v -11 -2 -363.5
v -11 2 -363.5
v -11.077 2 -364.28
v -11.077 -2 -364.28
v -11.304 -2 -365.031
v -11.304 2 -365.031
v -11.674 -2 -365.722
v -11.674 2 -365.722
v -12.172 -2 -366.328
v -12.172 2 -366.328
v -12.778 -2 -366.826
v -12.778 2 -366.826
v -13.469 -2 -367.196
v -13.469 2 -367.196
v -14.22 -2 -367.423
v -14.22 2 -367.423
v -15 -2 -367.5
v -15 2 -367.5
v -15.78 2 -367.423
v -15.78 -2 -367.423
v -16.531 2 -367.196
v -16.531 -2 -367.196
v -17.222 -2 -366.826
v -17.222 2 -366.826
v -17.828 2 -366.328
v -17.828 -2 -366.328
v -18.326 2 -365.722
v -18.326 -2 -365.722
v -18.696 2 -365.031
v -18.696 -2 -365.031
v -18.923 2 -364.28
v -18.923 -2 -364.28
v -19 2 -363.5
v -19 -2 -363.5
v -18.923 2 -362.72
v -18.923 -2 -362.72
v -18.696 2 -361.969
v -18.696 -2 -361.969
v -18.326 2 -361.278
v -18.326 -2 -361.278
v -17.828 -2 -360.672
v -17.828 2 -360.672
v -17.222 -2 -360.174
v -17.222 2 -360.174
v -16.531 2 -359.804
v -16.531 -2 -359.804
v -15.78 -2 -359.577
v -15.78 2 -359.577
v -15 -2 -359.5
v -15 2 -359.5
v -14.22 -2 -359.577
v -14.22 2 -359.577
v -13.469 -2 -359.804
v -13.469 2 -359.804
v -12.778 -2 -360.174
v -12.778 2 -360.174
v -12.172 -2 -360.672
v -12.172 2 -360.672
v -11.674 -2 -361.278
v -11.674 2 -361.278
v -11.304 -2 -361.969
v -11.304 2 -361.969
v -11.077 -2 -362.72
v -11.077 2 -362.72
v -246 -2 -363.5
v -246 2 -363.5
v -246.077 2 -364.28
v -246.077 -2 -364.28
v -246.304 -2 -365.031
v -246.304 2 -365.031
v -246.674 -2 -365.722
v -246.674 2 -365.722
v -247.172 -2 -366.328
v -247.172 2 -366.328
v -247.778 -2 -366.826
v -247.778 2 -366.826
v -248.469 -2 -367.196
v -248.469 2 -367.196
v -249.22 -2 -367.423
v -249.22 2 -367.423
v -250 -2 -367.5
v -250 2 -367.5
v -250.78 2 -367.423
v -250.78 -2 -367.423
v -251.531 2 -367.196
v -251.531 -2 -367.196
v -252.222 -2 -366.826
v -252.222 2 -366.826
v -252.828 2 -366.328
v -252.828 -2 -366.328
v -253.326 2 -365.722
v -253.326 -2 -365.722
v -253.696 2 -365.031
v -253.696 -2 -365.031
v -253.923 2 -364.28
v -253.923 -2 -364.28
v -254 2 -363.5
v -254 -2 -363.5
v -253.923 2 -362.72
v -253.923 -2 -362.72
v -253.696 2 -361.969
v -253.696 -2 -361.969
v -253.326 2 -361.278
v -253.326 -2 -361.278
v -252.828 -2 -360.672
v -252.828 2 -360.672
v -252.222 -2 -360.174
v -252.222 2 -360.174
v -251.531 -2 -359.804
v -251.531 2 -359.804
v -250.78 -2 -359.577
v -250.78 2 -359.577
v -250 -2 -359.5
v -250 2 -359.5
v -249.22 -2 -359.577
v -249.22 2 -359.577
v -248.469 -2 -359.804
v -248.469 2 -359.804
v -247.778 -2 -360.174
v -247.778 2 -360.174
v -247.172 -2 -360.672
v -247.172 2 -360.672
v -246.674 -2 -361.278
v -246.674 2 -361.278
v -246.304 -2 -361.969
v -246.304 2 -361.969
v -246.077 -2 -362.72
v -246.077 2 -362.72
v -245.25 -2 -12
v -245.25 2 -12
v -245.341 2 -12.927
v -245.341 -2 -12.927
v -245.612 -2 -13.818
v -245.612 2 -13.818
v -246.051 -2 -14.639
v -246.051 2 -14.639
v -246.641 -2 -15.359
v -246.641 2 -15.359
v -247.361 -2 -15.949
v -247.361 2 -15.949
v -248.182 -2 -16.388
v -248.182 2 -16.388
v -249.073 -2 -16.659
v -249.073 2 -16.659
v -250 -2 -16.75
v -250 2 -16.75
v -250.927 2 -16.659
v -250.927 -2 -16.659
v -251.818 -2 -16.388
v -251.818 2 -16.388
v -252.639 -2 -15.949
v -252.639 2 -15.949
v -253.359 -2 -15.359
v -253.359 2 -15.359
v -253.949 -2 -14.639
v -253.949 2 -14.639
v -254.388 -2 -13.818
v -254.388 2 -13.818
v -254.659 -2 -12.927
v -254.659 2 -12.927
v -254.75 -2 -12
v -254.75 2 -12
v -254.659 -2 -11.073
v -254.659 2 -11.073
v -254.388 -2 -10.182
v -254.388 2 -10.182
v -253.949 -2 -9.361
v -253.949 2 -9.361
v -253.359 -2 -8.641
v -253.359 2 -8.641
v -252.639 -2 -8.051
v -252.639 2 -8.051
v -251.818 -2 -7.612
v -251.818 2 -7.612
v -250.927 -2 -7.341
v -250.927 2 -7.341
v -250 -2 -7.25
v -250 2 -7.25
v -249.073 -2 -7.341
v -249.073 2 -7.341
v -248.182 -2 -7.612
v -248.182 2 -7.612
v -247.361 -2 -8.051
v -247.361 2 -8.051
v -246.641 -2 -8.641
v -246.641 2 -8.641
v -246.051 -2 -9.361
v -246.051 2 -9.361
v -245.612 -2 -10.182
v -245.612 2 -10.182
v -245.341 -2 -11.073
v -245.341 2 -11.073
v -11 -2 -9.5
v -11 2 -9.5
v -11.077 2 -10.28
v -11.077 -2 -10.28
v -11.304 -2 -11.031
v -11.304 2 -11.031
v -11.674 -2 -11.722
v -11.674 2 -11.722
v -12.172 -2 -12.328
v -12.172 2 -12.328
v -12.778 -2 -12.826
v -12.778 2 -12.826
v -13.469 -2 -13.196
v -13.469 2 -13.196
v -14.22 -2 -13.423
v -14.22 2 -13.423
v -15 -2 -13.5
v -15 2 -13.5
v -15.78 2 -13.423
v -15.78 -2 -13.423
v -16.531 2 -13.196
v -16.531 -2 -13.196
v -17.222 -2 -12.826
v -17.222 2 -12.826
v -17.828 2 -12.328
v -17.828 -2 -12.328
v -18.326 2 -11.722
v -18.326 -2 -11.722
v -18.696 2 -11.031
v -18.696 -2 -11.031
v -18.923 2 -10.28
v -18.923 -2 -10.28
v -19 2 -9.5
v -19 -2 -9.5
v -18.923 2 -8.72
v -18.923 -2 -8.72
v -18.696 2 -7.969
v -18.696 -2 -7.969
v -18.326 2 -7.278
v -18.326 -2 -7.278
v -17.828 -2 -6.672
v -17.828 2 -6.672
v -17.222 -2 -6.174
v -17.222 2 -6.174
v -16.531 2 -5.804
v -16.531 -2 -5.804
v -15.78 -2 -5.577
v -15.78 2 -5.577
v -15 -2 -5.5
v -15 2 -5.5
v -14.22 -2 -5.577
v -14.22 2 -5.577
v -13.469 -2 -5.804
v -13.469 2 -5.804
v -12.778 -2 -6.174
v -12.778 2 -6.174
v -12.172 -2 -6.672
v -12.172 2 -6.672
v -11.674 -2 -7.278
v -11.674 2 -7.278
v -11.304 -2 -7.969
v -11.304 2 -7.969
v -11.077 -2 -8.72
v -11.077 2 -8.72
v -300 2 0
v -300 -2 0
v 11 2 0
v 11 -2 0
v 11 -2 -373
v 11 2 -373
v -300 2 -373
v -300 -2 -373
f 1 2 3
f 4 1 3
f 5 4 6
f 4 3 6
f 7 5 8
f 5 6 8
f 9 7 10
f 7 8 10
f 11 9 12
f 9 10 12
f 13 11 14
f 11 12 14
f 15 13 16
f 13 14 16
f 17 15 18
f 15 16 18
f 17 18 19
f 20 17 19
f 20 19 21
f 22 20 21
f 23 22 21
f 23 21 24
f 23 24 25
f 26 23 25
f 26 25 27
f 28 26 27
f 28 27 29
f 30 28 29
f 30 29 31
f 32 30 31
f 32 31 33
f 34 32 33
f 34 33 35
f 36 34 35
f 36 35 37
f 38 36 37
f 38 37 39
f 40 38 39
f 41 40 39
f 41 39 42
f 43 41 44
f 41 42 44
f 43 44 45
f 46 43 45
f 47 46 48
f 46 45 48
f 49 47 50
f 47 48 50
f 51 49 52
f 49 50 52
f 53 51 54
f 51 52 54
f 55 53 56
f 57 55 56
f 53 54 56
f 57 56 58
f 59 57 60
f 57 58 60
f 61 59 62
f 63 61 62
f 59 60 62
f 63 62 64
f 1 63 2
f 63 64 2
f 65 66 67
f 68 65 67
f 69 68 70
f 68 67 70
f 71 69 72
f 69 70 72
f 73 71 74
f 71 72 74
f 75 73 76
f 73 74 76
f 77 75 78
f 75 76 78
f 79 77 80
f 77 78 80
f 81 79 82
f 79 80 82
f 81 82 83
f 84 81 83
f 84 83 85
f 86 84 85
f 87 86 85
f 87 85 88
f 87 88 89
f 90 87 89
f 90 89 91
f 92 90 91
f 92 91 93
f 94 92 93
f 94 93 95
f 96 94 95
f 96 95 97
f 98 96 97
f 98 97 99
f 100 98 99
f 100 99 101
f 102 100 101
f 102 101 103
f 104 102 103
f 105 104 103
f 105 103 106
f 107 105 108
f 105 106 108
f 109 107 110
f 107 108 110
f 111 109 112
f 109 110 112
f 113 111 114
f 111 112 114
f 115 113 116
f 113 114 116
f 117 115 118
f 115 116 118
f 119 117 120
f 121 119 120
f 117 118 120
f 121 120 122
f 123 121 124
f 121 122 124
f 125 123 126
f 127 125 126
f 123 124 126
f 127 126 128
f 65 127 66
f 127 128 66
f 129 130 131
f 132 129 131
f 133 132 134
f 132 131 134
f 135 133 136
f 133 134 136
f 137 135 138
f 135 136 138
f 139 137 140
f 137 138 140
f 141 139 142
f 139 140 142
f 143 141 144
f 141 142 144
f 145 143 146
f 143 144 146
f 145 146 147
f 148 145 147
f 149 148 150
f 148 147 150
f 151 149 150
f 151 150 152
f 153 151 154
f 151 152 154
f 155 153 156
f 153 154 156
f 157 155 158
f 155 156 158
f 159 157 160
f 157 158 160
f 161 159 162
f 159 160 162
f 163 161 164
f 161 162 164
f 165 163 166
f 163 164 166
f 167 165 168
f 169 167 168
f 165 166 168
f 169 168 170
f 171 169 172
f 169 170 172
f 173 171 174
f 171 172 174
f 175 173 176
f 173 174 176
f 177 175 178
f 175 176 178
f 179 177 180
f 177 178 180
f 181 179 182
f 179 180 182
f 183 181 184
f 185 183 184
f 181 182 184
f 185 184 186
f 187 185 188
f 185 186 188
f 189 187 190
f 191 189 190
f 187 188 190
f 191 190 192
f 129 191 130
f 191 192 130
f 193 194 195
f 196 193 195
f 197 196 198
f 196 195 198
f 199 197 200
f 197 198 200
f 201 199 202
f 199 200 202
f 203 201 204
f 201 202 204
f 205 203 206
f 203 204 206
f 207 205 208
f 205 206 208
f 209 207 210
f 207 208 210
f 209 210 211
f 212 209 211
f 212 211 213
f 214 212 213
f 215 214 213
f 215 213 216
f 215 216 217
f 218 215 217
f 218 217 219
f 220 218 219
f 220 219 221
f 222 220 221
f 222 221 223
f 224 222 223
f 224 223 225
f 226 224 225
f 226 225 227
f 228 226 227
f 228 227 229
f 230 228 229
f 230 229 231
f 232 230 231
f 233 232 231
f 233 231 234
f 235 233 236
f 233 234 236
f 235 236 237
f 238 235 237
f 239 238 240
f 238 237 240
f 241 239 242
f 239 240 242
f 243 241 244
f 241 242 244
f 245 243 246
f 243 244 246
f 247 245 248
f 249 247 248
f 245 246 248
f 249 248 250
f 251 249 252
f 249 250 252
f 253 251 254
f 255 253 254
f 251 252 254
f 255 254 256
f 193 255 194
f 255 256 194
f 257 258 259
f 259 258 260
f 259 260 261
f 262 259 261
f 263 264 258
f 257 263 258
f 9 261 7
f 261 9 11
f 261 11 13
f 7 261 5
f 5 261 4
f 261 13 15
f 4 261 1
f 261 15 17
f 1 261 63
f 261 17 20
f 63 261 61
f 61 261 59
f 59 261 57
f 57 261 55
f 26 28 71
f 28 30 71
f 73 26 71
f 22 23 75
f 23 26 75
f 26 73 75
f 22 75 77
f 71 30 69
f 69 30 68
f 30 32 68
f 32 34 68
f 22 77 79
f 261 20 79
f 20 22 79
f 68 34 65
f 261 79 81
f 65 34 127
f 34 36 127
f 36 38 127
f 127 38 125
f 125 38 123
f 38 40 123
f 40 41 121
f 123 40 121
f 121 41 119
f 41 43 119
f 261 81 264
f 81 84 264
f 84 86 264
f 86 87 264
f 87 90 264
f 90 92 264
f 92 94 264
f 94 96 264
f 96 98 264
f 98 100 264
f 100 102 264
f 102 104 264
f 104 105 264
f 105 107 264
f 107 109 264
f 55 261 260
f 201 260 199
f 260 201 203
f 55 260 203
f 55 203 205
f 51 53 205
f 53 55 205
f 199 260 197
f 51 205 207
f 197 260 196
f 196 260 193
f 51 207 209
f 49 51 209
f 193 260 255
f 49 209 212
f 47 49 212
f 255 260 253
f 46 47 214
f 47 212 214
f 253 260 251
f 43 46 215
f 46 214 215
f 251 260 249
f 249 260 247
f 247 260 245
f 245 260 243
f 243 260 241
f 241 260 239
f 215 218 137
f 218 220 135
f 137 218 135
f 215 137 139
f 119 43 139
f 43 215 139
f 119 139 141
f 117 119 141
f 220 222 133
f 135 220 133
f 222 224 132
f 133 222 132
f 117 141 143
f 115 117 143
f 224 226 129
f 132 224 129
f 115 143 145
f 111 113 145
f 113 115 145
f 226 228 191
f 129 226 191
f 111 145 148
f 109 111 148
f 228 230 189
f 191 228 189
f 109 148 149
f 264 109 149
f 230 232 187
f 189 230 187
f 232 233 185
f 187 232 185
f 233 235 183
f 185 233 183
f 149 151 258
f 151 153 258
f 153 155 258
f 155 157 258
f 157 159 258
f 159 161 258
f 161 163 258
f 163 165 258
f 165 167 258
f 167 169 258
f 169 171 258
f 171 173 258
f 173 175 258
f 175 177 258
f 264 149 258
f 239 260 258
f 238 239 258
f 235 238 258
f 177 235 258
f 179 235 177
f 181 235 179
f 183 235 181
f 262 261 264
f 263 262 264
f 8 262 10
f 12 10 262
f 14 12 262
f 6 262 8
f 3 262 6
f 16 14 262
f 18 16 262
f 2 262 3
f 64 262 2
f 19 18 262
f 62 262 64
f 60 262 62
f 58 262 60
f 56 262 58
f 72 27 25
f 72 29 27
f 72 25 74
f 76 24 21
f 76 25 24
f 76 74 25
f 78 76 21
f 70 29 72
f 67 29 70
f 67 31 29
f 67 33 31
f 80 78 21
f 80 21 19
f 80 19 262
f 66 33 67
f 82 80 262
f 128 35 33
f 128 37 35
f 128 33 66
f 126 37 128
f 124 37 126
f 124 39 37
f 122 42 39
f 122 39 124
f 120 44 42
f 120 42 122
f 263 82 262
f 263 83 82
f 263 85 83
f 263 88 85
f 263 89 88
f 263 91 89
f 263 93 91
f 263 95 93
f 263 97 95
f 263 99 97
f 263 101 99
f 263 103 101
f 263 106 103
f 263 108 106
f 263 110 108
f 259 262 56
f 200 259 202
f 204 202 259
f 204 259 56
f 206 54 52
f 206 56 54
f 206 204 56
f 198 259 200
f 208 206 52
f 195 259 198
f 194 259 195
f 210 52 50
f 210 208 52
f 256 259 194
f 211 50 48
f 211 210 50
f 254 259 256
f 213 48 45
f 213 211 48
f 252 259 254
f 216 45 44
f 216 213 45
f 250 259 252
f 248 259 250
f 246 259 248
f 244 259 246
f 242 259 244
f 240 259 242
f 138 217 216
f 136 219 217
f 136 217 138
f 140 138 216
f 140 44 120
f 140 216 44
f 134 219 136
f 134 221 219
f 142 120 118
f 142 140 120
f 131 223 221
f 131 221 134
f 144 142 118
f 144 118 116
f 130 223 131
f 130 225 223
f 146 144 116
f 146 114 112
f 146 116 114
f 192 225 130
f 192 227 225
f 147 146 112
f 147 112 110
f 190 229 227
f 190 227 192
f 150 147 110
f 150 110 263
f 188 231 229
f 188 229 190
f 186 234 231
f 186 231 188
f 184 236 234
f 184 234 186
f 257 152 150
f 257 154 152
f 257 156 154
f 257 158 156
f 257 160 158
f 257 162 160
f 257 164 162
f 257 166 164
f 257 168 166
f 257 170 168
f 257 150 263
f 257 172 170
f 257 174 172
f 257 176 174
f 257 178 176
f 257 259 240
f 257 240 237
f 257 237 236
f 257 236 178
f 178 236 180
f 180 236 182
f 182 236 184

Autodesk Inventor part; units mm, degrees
ref_plane "YZ Plane" through (0, 0, 0) normal (1, 0, 0) x (0, 1, 0)
ref_plane "XZ Plane" through (0, 0, 0) normal (0, 1, 0) x (-1, 0, 0)
ref_plane "XY Plane" through (0, 0, 0) normal (0, 0, 1) x (1, 0, 0)
sketch "Sketch1" plane through (0, 0, 0) normal (0, 1, 0) x (-1, 0, 0)
  line L0 (300, 0) -> (-11, 0)
  line L1 (-11, 0) -> (-11, -373)
  line L2 (-11, -373) -> (300, -373)
  line L3 (300, -373) -> (300, 0)
  point P0 (0, 0)
  dimension "d0" = 373
  dimension "d1" = 311
  dimension "d2" = 300
  dimension "d3" = 0
extrude "Extrusion1" add sketch "Sketch1" along normal mid plane 4
sketch "Sketch2" plane through (0, 2, 0) normal (0, 1, 0) x (1, 0, 0)
  circle A0 centre (-15, 9.5) radius 4
  circle A1 centre (-15, 363.5) radius 4
  circle A2 centre (-250, 12) radius 4.75
  circle A3 centre (-250, 363.5) radius 4
  line L0 (11, 373) -> (-300, 373) projected
  line L1 (-300, 373) -> (-300, 0) projected
  line L2 (-300, 0) -> (11, 0) projected
  line L3 (11, 0) -> (11, 373) projected
  point P0 (0, 0)
  dimension "d6" = 8
  dimension "d7" = 8
  dimension "d8" = 9.5
  dimension "d9" = 8
  dimension "d10" = 9.5
  dimension "d13" = 12
  dimension "d14" = 9.5
  dimension "d17" = 9.5
  dimension "d22" = 50
  dimension "d23" = 235
  dimension "d24" = 50
  dimension "d25" = 235
extrude "Extrusion2" cut sketch "Sketch2" against normal blind 4 contours A0 | A1 | A2 | A3
properties part number "Perspex base" material "Glass"
